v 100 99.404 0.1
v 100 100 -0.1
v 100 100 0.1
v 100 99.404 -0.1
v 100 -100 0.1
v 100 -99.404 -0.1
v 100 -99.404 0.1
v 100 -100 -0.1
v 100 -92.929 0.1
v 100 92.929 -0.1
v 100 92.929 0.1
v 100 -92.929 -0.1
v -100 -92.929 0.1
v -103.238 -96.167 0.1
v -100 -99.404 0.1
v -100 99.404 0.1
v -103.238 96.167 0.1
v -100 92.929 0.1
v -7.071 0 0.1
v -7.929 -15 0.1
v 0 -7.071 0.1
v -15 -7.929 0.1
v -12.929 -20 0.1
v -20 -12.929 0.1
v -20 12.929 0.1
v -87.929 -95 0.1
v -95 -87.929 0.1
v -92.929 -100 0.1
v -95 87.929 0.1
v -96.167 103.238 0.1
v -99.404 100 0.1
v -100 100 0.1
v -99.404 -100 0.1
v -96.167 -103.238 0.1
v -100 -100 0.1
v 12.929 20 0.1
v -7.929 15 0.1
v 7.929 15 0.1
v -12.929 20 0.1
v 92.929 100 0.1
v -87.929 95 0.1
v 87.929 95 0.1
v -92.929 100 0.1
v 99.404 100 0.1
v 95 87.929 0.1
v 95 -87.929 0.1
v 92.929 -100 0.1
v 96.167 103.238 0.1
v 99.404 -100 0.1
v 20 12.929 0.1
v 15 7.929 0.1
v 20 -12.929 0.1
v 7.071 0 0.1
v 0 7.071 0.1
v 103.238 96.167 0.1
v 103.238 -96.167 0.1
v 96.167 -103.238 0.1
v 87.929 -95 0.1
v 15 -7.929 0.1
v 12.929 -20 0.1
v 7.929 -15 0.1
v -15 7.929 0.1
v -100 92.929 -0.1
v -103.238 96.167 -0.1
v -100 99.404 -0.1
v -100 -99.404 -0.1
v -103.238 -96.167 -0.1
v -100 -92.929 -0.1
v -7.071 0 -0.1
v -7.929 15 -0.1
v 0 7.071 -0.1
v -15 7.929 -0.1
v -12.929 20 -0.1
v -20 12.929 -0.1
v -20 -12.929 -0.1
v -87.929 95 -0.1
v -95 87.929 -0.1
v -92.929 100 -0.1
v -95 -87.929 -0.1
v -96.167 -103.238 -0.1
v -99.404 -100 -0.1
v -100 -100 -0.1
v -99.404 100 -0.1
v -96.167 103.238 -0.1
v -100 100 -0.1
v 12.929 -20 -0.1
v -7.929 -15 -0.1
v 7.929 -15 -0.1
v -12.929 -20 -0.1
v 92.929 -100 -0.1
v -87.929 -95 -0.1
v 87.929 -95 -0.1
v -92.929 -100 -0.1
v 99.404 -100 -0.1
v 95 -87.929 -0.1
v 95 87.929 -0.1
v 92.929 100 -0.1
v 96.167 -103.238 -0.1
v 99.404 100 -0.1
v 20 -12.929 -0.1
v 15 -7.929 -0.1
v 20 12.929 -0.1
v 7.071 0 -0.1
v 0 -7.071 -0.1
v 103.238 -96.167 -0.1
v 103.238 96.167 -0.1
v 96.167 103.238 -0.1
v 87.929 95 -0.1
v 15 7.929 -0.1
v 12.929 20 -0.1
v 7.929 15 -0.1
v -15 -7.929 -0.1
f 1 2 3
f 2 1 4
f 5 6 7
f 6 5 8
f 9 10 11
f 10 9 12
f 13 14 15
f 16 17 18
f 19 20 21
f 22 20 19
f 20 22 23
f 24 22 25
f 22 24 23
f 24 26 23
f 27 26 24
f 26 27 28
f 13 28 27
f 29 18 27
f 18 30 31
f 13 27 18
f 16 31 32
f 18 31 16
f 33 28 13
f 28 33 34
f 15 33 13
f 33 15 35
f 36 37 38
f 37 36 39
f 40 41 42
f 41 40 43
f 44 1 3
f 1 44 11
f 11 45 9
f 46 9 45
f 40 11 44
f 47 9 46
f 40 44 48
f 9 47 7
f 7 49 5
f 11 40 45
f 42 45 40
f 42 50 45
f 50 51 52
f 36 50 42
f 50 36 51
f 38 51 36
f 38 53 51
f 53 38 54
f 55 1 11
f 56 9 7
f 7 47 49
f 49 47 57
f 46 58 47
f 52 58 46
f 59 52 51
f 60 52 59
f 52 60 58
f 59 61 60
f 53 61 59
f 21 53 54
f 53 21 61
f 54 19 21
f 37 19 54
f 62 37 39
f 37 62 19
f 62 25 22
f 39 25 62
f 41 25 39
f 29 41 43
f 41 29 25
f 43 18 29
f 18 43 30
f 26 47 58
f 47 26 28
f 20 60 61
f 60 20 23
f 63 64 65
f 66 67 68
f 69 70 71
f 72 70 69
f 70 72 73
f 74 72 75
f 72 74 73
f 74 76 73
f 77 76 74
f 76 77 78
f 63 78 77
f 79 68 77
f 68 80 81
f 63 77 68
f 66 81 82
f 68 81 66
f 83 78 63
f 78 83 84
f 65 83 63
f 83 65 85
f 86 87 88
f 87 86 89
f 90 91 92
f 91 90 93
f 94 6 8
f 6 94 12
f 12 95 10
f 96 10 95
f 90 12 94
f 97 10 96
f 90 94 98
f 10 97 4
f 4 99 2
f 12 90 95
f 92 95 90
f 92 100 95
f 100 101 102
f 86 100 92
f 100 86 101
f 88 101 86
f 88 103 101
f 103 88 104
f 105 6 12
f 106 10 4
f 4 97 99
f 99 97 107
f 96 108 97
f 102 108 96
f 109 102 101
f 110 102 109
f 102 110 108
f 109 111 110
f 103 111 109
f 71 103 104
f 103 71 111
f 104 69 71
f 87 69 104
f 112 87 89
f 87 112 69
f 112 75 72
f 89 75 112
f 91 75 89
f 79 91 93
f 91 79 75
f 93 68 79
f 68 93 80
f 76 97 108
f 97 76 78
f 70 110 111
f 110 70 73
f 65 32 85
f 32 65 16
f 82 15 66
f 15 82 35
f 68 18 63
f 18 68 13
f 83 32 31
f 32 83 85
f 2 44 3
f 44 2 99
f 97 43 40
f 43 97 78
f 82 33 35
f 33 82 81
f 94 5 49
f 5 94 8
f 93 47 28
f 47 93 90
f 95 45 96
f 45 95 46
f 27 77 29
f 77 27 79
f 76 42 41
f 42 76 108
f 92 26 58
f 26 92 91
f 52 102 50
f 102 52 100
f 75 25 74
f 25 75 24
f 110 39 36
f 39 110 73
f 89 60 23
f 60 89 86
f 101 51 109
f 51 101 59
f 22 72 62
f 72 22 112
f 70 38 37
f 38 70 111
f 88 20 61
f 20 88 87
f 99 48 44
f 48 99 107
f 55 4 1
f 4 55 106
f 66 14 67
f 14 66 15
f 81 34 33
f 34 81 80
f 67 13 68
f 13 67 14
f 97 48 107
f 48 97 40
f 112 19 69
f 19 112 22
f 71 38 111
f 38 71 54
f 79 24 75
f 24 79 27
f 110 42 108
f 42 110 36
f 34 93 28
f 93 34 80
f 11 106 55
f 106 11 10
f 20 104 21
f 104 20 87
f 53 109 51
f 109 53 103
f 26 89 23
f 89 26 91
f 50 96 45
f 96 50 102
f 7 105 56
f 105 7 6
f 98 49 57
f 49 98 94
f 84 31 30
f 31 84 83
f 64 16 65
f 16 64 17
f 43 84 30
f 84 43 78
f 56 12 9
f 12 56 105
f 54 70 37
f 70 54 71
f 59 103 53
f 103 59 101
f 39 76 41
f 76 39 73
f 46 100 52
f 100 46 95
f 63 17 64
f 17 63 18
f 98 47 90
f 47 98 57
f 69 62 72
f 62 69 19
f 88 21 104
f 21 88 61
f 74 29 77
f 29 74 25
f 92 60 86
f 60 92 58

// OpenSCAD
difference()
{
    cube([200,200,0.2],center = true);
    cube([190,190,0.3],center = true);
}

difference()
{
    cube([40,40,0.2],center = true);
    cube([30,30,0.3],center = true);
}


rotate([0,0,45])
    cube([282,10,0.2],center = true);


rotate([0,0,-45])
    cube([282,10,0.2],center = true);
